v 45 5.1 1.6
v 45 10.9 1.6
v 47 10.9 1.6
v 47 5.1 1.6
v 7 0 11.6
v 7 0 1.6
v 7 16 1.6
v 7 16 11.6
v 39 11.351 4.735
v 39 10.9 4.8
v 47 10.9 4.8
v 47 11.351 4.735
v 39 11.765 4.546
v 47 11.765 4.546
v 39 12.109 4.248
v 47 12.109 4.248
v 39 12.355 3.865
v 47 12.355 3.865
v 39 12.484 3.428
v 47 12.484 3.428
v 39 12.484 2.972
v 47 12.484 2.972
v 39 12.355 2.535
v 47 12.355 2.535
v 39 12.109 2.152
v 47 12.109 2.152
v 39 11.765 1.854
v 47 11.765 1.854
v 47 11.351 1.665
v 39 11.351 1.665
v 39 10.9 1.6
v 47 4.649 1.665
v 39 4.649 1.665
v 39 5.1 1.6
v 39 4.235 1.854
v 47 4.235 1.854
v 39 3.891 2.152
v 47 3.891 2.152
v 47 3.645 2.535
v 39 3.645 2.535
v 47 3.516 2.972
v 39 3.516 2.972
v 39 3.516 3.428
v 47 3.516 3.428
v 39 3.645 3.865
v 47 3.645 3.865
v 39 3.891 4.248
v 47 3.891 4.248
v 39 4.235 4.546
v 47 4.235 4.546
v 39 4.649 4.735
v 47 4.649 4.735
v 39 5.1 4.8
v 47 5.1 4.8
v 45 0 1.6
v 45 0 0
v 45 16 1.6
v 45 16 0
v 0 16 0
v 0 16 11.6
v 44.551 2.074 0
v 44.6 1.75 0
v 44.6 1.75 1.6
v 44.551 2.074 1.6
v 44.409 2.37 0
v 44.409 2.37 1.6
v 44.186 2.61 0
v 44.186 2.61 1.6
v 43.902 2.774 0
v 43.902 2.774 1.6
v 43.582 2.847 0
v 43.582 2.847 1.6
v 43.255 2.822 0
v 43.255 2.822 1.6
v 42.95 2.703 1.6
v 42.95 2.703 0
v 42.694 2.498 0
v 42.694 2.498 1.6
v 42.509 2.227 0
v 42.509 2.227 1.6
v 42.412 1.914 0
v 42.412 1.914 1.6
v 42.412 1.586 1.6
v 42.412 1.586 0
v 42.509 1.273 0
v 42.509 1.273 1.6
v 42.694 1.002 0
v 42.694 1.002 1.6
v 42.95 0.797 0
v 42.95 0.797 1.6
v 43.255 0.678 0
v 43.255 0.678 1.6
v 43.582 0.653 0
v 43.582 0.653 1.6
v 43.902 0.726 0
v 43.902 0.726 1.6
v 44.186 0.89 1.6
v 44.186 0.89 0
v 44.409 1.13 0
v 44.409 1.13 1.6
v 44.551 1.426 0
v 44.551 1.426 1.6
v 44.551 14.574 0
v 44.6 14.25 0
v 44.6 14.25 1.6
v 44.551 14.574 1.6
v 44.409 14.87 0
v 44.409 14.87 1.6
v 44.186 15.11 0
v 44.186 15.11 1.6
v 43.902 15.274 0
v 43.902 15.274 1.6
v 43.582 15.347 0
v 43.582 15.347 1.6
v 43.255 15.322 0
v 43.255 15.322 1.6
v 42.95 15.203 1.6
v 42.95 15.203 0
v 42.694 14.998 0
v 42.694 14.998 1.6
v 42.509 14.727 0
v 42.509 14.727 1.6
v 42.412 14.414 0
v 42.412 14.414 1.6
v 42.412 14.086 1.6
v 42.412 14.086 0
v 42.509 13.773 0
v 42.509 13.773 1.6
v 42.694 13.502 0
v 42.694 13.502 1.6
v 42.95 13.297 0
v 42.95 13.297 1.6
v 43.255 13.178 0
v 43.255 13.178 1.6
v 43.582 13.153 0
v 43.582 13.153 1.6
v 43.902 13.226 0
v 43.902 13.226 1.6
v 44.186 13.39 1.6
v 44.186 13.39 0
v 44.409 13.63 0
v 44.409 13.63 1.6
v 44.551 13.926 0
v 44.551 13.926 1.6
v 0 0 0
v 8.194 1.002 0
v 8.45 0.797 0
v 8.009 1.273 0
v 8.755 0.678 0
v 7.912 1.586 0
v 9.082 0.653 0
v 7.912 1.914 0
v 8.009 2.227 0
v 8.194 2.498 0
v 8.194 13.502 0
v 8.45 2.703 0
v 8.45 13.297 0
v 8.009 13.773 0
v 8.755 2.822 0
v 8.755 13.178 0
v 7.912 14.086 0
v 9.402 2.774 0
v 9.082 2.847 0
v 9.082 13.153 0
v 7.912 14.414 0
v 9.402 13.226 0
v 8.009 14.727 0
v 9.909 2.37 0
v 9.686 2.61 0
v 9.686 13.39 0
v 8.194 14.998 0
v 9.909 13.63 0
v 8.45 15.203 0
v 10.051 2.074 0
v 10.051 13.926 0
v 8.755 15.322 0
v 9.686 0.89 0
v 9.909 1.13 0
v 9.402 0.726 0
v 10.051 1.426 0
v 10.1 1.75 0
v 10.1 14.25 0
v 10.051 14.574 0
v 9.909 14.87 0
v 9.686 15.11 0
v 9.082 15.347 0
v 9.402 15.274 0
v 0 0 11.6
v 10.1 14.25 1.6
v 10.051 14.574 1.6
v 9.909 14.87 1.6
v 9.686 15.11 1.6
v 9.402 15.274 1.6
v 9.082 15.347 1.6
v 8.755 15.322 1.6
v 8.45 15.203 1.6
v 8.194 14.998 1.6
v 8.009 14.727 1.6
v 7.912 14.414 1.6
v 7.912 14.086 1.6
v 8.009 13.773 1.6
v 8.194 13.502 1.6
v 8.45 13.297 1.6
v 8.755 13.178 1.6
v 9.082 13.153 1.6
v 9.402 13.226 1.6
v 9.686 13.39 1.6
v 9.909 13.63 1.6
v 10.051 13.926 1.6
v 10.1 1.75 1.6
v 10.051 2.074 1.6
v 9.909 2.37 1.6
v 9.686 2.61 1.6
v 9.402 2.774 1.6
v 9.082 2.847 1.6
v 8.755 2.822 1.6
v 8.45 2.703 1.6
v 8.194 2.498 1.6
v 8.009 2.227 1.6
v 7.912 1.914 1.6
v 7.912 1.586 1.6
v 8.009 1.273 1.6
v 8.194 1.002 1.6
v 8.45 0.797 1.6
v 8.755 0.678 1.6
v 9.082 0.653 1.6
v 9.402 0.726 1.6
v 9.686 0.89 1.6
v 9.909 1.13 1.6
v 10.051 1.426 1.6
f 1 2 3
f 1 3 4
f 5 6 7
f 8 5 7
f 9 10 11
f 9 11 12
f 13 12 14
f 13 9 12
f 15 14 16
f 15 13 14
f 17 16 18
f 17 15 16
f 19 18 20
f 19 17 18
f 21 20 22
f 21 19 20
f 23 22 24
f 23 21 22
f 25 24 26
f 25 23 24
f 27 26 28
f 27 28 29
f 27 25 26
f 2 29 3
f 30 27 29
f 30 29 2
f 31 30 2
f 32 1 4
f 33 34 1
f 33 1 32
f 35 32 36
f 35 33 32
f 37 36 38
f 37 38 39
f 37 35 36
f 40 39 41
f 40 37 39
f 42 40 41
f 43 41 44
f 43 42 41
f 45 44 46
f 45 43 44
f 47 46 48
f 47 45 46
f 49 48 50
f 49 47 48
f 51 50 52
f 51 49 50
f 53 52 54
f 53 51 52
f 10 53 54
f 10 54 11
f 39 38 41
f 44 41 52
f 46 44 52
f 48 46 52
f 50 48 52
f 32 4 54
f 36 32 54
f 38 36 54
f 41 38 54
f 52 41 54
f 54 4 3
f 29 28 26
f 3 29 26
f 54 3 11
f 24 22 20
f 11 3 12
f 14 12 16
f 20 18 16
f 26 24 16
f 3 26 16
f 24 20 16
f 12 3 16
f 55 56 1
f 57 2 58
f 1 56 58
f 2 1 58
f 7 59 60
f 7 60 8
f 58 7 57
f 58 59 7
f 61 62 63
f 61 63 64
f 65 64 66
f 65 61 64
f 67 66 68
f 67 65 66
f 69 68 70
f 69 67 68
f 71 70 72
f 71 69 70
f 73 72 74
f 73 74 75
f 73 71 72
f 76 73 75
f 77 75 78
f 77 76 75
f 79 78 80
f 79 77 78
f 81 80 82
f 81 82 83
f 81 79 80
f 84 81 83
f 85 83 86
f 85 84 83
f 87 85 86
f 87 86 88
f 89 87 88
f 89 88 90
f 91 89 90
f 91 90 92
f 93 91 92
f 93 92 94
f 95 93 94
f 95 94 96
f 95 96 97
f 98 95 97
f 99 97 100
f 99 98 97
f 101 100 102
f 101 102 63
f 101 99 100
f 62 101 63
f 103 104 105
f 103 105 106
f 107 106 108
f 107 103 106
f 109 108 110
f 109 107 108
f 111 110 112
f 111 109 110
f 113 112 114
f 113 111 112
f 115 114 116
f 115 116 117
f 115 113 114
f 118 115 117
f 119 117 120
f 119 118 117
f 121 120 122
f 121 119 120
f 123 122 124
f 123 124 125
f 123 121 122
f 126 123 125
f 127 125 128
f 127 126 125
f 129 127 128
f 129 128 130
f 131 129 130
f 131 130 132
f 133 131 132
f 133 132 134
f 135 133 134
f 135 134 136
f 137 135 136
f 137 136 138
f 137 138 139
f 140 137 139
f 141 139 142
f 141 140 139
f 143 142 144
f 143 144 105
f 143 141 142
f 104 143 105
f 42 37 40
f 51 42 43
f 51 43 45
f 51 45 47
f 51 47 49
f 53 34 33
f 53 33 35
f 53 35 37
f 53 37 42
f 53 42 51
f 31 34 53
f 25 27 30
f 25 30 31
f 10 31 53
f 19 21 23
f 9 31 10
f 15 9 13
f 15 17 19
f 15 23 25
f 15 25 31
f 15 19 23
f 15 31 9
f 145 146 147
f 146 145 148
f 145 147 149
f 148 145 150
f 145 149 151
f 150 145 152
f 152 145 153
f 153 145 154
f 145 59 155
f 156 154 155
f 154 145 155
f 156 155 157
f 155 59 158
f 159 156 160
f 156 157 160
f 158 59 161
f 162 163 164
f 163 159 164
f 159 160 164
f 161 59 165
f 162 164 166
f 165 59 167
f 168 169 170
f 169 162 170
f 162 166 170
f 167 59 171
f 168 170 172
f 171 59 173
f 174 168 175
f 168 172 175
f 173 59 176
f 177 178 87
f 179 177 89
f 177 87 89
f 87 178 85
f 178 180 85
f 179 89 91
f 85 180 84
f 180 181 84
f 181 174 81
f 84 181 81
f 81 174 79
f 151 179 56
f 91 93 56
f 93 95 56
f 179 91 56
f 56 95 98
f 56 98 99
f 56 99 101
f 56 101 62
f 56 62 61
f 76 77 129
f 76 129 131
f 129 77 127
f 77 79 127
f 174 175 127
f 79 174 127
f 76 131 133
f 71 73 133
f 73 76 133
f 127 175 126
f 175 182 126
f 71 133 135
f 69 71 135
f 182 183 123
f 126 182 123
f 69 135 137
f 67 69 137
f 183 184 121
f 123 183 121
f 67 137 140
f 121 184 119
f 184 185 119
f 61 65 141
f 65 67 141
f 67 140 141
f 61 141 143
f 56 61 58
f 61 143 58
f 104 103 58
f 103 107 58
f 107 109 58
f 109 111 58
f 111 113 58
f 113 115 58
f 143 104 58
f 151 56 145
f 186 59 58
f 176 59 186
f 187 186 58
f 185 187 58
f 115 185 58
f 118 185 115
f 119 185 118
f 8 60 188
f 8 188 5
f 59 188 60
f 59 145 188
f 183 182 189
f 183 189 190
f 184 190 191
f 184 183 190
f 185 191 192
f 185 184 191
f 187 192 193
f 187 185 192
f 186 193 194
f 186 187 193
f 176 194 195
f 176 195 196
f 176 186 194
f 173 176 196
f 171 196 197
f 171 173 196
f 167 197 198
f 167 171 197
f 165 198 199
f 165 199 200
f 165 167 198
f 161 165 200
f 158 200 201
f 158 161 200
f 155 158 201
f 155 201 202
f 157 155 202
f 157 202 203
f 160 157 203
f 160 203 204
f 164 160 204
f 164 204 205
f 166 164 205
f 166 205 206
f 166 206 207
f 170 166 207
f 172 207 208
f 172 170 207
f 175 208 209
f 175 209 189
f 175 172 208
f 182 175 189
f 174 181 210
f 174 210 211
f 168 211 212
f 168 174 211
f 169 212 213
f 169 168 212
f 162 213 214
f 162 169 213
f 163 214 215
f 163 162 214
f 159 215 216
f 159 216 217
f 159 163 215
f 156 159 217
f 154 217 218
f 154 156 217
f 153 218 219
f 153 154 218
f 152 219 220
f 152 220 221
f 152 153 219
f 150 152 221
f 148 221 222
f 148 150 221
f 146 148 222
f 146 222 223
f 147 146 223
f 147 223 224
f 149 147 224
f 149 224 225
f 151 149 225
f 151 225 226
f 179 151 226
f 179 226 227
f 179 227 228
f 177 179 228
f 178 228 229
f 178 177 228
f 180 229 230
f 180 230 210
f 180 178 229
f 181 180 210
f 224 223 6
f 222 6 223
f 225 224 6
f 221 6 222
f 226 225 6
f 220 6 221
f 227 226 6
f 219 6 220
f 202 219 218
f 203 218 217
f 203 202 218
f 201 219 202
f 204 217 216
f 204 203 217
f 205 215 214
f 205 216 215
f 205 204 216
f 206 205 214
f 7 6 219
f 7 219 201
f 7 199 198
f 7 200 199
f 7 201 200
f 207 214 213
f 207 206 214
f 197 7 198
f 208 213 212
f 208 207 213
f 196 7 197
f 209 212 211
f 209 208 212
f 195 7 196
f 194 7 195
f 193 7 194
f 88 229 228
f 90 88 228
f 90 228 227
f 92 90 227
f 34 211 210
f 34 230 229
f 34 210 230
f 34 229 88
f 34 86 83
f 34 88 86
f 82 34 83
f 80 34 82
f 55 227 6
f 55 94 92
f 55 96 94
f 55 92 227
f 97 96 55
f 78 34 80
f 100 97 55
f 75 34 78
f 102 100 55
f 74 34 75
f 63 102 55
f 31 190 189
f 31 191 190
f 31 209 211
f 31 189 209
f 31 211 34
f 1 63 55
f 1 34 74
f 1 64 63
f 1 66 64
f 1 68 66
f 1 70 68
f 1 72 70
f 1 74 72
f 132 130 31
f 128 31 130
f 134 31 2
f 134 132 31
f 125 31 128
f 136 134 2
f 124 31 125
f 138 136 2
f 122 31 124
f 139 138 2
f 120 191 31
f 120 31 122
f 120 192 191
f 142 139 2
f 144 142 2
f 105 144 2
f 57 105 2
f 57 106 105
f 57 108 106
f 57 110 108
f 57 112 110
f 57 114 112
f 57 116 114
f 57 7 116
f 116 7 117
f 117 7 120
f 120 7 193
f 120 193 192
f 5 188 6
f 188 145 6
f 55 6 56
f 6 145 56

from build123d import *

# Parameters (mm, degrees)
SKETCH1_W                = 45
SKETCH1_H                = 16
SKETCH1_R                = 1.1
BOSS_EXTRUDE1_DEPTH      = 1.6
BOSS_EXTRUDE2_DEPTH      = 2
BOSS_EXTRUDE2_DEPTH_BACK = 6
SKETCH3_W                = 7
SKETCH3_H                = 16
BOSS_EXTRUDE3_DEPTH      = 10


with BuildPart() as part:
    # Sketch1 → Boss-Extrude1 (new body)
    with BuildSketch(Plane.XY):
        with Locations((22.5, 8)):
            Rectangle(SKETCH1_W, SKETCH1_H)
        with Locations((9, 14.25)):
            Circle(SKETCH1_R, mode=Mode.SUBTRACT)
        with Locations((9, 1.75)):
            Circle(SKETCH1_R, mode=Mode.SUBTRACT)
        with Locations((43.5, 14.25)):
            Circle(SKETCH1_R, mode=Mode.SUBTRACT)
        with Locations((43.5, 1.75)):
            Circle(SKETCH1_R, mode=Mode.SUBTRACT)
    extrude(amount=BOSS_EXTRUDE1_DEPTH)

    # Sketch2 → Boss-Extrude2 (add, two sides: drawn at the far end of the back side and taken through both)
    with BuildSketch(Plane(origin=(45, 0, 0), x_dir=(0, 0, -1), z_dir=(1, 0, 0)).offset(-BOSS_EXTRUDE2_DEPTH_BACK)):
        with BuildLine():
            Line((-1.6, 10.9), (-1.6, 5.1))
            ThreePointArc((-1.6, 5.1), (-3.2, 3.5), (-4.8, 5.1))
            Line((-4.8, 5.1), (-4.8, 10.9))
            ThreePointArc((-4.8, 10.9), (-3.2, 12.5), (-1.6, 10.9))
        make_face()
    extrude(amount=BOSS_EXTRUDE2_DEPTH + BOSS_EXTRUDE2_DEPTH_BACK)

    # Sketch3 → Boss-Extrude3 (add)
    with BuildSketch(Plane.XY.offset(1.6)):
        with Locations((3.5, 8)):
            Rectangle(SKETCH3_W, SKETCH3_H)
    extrude(amount=BOSS_EXTRUDE3_DEPTH)


solid = part.part
